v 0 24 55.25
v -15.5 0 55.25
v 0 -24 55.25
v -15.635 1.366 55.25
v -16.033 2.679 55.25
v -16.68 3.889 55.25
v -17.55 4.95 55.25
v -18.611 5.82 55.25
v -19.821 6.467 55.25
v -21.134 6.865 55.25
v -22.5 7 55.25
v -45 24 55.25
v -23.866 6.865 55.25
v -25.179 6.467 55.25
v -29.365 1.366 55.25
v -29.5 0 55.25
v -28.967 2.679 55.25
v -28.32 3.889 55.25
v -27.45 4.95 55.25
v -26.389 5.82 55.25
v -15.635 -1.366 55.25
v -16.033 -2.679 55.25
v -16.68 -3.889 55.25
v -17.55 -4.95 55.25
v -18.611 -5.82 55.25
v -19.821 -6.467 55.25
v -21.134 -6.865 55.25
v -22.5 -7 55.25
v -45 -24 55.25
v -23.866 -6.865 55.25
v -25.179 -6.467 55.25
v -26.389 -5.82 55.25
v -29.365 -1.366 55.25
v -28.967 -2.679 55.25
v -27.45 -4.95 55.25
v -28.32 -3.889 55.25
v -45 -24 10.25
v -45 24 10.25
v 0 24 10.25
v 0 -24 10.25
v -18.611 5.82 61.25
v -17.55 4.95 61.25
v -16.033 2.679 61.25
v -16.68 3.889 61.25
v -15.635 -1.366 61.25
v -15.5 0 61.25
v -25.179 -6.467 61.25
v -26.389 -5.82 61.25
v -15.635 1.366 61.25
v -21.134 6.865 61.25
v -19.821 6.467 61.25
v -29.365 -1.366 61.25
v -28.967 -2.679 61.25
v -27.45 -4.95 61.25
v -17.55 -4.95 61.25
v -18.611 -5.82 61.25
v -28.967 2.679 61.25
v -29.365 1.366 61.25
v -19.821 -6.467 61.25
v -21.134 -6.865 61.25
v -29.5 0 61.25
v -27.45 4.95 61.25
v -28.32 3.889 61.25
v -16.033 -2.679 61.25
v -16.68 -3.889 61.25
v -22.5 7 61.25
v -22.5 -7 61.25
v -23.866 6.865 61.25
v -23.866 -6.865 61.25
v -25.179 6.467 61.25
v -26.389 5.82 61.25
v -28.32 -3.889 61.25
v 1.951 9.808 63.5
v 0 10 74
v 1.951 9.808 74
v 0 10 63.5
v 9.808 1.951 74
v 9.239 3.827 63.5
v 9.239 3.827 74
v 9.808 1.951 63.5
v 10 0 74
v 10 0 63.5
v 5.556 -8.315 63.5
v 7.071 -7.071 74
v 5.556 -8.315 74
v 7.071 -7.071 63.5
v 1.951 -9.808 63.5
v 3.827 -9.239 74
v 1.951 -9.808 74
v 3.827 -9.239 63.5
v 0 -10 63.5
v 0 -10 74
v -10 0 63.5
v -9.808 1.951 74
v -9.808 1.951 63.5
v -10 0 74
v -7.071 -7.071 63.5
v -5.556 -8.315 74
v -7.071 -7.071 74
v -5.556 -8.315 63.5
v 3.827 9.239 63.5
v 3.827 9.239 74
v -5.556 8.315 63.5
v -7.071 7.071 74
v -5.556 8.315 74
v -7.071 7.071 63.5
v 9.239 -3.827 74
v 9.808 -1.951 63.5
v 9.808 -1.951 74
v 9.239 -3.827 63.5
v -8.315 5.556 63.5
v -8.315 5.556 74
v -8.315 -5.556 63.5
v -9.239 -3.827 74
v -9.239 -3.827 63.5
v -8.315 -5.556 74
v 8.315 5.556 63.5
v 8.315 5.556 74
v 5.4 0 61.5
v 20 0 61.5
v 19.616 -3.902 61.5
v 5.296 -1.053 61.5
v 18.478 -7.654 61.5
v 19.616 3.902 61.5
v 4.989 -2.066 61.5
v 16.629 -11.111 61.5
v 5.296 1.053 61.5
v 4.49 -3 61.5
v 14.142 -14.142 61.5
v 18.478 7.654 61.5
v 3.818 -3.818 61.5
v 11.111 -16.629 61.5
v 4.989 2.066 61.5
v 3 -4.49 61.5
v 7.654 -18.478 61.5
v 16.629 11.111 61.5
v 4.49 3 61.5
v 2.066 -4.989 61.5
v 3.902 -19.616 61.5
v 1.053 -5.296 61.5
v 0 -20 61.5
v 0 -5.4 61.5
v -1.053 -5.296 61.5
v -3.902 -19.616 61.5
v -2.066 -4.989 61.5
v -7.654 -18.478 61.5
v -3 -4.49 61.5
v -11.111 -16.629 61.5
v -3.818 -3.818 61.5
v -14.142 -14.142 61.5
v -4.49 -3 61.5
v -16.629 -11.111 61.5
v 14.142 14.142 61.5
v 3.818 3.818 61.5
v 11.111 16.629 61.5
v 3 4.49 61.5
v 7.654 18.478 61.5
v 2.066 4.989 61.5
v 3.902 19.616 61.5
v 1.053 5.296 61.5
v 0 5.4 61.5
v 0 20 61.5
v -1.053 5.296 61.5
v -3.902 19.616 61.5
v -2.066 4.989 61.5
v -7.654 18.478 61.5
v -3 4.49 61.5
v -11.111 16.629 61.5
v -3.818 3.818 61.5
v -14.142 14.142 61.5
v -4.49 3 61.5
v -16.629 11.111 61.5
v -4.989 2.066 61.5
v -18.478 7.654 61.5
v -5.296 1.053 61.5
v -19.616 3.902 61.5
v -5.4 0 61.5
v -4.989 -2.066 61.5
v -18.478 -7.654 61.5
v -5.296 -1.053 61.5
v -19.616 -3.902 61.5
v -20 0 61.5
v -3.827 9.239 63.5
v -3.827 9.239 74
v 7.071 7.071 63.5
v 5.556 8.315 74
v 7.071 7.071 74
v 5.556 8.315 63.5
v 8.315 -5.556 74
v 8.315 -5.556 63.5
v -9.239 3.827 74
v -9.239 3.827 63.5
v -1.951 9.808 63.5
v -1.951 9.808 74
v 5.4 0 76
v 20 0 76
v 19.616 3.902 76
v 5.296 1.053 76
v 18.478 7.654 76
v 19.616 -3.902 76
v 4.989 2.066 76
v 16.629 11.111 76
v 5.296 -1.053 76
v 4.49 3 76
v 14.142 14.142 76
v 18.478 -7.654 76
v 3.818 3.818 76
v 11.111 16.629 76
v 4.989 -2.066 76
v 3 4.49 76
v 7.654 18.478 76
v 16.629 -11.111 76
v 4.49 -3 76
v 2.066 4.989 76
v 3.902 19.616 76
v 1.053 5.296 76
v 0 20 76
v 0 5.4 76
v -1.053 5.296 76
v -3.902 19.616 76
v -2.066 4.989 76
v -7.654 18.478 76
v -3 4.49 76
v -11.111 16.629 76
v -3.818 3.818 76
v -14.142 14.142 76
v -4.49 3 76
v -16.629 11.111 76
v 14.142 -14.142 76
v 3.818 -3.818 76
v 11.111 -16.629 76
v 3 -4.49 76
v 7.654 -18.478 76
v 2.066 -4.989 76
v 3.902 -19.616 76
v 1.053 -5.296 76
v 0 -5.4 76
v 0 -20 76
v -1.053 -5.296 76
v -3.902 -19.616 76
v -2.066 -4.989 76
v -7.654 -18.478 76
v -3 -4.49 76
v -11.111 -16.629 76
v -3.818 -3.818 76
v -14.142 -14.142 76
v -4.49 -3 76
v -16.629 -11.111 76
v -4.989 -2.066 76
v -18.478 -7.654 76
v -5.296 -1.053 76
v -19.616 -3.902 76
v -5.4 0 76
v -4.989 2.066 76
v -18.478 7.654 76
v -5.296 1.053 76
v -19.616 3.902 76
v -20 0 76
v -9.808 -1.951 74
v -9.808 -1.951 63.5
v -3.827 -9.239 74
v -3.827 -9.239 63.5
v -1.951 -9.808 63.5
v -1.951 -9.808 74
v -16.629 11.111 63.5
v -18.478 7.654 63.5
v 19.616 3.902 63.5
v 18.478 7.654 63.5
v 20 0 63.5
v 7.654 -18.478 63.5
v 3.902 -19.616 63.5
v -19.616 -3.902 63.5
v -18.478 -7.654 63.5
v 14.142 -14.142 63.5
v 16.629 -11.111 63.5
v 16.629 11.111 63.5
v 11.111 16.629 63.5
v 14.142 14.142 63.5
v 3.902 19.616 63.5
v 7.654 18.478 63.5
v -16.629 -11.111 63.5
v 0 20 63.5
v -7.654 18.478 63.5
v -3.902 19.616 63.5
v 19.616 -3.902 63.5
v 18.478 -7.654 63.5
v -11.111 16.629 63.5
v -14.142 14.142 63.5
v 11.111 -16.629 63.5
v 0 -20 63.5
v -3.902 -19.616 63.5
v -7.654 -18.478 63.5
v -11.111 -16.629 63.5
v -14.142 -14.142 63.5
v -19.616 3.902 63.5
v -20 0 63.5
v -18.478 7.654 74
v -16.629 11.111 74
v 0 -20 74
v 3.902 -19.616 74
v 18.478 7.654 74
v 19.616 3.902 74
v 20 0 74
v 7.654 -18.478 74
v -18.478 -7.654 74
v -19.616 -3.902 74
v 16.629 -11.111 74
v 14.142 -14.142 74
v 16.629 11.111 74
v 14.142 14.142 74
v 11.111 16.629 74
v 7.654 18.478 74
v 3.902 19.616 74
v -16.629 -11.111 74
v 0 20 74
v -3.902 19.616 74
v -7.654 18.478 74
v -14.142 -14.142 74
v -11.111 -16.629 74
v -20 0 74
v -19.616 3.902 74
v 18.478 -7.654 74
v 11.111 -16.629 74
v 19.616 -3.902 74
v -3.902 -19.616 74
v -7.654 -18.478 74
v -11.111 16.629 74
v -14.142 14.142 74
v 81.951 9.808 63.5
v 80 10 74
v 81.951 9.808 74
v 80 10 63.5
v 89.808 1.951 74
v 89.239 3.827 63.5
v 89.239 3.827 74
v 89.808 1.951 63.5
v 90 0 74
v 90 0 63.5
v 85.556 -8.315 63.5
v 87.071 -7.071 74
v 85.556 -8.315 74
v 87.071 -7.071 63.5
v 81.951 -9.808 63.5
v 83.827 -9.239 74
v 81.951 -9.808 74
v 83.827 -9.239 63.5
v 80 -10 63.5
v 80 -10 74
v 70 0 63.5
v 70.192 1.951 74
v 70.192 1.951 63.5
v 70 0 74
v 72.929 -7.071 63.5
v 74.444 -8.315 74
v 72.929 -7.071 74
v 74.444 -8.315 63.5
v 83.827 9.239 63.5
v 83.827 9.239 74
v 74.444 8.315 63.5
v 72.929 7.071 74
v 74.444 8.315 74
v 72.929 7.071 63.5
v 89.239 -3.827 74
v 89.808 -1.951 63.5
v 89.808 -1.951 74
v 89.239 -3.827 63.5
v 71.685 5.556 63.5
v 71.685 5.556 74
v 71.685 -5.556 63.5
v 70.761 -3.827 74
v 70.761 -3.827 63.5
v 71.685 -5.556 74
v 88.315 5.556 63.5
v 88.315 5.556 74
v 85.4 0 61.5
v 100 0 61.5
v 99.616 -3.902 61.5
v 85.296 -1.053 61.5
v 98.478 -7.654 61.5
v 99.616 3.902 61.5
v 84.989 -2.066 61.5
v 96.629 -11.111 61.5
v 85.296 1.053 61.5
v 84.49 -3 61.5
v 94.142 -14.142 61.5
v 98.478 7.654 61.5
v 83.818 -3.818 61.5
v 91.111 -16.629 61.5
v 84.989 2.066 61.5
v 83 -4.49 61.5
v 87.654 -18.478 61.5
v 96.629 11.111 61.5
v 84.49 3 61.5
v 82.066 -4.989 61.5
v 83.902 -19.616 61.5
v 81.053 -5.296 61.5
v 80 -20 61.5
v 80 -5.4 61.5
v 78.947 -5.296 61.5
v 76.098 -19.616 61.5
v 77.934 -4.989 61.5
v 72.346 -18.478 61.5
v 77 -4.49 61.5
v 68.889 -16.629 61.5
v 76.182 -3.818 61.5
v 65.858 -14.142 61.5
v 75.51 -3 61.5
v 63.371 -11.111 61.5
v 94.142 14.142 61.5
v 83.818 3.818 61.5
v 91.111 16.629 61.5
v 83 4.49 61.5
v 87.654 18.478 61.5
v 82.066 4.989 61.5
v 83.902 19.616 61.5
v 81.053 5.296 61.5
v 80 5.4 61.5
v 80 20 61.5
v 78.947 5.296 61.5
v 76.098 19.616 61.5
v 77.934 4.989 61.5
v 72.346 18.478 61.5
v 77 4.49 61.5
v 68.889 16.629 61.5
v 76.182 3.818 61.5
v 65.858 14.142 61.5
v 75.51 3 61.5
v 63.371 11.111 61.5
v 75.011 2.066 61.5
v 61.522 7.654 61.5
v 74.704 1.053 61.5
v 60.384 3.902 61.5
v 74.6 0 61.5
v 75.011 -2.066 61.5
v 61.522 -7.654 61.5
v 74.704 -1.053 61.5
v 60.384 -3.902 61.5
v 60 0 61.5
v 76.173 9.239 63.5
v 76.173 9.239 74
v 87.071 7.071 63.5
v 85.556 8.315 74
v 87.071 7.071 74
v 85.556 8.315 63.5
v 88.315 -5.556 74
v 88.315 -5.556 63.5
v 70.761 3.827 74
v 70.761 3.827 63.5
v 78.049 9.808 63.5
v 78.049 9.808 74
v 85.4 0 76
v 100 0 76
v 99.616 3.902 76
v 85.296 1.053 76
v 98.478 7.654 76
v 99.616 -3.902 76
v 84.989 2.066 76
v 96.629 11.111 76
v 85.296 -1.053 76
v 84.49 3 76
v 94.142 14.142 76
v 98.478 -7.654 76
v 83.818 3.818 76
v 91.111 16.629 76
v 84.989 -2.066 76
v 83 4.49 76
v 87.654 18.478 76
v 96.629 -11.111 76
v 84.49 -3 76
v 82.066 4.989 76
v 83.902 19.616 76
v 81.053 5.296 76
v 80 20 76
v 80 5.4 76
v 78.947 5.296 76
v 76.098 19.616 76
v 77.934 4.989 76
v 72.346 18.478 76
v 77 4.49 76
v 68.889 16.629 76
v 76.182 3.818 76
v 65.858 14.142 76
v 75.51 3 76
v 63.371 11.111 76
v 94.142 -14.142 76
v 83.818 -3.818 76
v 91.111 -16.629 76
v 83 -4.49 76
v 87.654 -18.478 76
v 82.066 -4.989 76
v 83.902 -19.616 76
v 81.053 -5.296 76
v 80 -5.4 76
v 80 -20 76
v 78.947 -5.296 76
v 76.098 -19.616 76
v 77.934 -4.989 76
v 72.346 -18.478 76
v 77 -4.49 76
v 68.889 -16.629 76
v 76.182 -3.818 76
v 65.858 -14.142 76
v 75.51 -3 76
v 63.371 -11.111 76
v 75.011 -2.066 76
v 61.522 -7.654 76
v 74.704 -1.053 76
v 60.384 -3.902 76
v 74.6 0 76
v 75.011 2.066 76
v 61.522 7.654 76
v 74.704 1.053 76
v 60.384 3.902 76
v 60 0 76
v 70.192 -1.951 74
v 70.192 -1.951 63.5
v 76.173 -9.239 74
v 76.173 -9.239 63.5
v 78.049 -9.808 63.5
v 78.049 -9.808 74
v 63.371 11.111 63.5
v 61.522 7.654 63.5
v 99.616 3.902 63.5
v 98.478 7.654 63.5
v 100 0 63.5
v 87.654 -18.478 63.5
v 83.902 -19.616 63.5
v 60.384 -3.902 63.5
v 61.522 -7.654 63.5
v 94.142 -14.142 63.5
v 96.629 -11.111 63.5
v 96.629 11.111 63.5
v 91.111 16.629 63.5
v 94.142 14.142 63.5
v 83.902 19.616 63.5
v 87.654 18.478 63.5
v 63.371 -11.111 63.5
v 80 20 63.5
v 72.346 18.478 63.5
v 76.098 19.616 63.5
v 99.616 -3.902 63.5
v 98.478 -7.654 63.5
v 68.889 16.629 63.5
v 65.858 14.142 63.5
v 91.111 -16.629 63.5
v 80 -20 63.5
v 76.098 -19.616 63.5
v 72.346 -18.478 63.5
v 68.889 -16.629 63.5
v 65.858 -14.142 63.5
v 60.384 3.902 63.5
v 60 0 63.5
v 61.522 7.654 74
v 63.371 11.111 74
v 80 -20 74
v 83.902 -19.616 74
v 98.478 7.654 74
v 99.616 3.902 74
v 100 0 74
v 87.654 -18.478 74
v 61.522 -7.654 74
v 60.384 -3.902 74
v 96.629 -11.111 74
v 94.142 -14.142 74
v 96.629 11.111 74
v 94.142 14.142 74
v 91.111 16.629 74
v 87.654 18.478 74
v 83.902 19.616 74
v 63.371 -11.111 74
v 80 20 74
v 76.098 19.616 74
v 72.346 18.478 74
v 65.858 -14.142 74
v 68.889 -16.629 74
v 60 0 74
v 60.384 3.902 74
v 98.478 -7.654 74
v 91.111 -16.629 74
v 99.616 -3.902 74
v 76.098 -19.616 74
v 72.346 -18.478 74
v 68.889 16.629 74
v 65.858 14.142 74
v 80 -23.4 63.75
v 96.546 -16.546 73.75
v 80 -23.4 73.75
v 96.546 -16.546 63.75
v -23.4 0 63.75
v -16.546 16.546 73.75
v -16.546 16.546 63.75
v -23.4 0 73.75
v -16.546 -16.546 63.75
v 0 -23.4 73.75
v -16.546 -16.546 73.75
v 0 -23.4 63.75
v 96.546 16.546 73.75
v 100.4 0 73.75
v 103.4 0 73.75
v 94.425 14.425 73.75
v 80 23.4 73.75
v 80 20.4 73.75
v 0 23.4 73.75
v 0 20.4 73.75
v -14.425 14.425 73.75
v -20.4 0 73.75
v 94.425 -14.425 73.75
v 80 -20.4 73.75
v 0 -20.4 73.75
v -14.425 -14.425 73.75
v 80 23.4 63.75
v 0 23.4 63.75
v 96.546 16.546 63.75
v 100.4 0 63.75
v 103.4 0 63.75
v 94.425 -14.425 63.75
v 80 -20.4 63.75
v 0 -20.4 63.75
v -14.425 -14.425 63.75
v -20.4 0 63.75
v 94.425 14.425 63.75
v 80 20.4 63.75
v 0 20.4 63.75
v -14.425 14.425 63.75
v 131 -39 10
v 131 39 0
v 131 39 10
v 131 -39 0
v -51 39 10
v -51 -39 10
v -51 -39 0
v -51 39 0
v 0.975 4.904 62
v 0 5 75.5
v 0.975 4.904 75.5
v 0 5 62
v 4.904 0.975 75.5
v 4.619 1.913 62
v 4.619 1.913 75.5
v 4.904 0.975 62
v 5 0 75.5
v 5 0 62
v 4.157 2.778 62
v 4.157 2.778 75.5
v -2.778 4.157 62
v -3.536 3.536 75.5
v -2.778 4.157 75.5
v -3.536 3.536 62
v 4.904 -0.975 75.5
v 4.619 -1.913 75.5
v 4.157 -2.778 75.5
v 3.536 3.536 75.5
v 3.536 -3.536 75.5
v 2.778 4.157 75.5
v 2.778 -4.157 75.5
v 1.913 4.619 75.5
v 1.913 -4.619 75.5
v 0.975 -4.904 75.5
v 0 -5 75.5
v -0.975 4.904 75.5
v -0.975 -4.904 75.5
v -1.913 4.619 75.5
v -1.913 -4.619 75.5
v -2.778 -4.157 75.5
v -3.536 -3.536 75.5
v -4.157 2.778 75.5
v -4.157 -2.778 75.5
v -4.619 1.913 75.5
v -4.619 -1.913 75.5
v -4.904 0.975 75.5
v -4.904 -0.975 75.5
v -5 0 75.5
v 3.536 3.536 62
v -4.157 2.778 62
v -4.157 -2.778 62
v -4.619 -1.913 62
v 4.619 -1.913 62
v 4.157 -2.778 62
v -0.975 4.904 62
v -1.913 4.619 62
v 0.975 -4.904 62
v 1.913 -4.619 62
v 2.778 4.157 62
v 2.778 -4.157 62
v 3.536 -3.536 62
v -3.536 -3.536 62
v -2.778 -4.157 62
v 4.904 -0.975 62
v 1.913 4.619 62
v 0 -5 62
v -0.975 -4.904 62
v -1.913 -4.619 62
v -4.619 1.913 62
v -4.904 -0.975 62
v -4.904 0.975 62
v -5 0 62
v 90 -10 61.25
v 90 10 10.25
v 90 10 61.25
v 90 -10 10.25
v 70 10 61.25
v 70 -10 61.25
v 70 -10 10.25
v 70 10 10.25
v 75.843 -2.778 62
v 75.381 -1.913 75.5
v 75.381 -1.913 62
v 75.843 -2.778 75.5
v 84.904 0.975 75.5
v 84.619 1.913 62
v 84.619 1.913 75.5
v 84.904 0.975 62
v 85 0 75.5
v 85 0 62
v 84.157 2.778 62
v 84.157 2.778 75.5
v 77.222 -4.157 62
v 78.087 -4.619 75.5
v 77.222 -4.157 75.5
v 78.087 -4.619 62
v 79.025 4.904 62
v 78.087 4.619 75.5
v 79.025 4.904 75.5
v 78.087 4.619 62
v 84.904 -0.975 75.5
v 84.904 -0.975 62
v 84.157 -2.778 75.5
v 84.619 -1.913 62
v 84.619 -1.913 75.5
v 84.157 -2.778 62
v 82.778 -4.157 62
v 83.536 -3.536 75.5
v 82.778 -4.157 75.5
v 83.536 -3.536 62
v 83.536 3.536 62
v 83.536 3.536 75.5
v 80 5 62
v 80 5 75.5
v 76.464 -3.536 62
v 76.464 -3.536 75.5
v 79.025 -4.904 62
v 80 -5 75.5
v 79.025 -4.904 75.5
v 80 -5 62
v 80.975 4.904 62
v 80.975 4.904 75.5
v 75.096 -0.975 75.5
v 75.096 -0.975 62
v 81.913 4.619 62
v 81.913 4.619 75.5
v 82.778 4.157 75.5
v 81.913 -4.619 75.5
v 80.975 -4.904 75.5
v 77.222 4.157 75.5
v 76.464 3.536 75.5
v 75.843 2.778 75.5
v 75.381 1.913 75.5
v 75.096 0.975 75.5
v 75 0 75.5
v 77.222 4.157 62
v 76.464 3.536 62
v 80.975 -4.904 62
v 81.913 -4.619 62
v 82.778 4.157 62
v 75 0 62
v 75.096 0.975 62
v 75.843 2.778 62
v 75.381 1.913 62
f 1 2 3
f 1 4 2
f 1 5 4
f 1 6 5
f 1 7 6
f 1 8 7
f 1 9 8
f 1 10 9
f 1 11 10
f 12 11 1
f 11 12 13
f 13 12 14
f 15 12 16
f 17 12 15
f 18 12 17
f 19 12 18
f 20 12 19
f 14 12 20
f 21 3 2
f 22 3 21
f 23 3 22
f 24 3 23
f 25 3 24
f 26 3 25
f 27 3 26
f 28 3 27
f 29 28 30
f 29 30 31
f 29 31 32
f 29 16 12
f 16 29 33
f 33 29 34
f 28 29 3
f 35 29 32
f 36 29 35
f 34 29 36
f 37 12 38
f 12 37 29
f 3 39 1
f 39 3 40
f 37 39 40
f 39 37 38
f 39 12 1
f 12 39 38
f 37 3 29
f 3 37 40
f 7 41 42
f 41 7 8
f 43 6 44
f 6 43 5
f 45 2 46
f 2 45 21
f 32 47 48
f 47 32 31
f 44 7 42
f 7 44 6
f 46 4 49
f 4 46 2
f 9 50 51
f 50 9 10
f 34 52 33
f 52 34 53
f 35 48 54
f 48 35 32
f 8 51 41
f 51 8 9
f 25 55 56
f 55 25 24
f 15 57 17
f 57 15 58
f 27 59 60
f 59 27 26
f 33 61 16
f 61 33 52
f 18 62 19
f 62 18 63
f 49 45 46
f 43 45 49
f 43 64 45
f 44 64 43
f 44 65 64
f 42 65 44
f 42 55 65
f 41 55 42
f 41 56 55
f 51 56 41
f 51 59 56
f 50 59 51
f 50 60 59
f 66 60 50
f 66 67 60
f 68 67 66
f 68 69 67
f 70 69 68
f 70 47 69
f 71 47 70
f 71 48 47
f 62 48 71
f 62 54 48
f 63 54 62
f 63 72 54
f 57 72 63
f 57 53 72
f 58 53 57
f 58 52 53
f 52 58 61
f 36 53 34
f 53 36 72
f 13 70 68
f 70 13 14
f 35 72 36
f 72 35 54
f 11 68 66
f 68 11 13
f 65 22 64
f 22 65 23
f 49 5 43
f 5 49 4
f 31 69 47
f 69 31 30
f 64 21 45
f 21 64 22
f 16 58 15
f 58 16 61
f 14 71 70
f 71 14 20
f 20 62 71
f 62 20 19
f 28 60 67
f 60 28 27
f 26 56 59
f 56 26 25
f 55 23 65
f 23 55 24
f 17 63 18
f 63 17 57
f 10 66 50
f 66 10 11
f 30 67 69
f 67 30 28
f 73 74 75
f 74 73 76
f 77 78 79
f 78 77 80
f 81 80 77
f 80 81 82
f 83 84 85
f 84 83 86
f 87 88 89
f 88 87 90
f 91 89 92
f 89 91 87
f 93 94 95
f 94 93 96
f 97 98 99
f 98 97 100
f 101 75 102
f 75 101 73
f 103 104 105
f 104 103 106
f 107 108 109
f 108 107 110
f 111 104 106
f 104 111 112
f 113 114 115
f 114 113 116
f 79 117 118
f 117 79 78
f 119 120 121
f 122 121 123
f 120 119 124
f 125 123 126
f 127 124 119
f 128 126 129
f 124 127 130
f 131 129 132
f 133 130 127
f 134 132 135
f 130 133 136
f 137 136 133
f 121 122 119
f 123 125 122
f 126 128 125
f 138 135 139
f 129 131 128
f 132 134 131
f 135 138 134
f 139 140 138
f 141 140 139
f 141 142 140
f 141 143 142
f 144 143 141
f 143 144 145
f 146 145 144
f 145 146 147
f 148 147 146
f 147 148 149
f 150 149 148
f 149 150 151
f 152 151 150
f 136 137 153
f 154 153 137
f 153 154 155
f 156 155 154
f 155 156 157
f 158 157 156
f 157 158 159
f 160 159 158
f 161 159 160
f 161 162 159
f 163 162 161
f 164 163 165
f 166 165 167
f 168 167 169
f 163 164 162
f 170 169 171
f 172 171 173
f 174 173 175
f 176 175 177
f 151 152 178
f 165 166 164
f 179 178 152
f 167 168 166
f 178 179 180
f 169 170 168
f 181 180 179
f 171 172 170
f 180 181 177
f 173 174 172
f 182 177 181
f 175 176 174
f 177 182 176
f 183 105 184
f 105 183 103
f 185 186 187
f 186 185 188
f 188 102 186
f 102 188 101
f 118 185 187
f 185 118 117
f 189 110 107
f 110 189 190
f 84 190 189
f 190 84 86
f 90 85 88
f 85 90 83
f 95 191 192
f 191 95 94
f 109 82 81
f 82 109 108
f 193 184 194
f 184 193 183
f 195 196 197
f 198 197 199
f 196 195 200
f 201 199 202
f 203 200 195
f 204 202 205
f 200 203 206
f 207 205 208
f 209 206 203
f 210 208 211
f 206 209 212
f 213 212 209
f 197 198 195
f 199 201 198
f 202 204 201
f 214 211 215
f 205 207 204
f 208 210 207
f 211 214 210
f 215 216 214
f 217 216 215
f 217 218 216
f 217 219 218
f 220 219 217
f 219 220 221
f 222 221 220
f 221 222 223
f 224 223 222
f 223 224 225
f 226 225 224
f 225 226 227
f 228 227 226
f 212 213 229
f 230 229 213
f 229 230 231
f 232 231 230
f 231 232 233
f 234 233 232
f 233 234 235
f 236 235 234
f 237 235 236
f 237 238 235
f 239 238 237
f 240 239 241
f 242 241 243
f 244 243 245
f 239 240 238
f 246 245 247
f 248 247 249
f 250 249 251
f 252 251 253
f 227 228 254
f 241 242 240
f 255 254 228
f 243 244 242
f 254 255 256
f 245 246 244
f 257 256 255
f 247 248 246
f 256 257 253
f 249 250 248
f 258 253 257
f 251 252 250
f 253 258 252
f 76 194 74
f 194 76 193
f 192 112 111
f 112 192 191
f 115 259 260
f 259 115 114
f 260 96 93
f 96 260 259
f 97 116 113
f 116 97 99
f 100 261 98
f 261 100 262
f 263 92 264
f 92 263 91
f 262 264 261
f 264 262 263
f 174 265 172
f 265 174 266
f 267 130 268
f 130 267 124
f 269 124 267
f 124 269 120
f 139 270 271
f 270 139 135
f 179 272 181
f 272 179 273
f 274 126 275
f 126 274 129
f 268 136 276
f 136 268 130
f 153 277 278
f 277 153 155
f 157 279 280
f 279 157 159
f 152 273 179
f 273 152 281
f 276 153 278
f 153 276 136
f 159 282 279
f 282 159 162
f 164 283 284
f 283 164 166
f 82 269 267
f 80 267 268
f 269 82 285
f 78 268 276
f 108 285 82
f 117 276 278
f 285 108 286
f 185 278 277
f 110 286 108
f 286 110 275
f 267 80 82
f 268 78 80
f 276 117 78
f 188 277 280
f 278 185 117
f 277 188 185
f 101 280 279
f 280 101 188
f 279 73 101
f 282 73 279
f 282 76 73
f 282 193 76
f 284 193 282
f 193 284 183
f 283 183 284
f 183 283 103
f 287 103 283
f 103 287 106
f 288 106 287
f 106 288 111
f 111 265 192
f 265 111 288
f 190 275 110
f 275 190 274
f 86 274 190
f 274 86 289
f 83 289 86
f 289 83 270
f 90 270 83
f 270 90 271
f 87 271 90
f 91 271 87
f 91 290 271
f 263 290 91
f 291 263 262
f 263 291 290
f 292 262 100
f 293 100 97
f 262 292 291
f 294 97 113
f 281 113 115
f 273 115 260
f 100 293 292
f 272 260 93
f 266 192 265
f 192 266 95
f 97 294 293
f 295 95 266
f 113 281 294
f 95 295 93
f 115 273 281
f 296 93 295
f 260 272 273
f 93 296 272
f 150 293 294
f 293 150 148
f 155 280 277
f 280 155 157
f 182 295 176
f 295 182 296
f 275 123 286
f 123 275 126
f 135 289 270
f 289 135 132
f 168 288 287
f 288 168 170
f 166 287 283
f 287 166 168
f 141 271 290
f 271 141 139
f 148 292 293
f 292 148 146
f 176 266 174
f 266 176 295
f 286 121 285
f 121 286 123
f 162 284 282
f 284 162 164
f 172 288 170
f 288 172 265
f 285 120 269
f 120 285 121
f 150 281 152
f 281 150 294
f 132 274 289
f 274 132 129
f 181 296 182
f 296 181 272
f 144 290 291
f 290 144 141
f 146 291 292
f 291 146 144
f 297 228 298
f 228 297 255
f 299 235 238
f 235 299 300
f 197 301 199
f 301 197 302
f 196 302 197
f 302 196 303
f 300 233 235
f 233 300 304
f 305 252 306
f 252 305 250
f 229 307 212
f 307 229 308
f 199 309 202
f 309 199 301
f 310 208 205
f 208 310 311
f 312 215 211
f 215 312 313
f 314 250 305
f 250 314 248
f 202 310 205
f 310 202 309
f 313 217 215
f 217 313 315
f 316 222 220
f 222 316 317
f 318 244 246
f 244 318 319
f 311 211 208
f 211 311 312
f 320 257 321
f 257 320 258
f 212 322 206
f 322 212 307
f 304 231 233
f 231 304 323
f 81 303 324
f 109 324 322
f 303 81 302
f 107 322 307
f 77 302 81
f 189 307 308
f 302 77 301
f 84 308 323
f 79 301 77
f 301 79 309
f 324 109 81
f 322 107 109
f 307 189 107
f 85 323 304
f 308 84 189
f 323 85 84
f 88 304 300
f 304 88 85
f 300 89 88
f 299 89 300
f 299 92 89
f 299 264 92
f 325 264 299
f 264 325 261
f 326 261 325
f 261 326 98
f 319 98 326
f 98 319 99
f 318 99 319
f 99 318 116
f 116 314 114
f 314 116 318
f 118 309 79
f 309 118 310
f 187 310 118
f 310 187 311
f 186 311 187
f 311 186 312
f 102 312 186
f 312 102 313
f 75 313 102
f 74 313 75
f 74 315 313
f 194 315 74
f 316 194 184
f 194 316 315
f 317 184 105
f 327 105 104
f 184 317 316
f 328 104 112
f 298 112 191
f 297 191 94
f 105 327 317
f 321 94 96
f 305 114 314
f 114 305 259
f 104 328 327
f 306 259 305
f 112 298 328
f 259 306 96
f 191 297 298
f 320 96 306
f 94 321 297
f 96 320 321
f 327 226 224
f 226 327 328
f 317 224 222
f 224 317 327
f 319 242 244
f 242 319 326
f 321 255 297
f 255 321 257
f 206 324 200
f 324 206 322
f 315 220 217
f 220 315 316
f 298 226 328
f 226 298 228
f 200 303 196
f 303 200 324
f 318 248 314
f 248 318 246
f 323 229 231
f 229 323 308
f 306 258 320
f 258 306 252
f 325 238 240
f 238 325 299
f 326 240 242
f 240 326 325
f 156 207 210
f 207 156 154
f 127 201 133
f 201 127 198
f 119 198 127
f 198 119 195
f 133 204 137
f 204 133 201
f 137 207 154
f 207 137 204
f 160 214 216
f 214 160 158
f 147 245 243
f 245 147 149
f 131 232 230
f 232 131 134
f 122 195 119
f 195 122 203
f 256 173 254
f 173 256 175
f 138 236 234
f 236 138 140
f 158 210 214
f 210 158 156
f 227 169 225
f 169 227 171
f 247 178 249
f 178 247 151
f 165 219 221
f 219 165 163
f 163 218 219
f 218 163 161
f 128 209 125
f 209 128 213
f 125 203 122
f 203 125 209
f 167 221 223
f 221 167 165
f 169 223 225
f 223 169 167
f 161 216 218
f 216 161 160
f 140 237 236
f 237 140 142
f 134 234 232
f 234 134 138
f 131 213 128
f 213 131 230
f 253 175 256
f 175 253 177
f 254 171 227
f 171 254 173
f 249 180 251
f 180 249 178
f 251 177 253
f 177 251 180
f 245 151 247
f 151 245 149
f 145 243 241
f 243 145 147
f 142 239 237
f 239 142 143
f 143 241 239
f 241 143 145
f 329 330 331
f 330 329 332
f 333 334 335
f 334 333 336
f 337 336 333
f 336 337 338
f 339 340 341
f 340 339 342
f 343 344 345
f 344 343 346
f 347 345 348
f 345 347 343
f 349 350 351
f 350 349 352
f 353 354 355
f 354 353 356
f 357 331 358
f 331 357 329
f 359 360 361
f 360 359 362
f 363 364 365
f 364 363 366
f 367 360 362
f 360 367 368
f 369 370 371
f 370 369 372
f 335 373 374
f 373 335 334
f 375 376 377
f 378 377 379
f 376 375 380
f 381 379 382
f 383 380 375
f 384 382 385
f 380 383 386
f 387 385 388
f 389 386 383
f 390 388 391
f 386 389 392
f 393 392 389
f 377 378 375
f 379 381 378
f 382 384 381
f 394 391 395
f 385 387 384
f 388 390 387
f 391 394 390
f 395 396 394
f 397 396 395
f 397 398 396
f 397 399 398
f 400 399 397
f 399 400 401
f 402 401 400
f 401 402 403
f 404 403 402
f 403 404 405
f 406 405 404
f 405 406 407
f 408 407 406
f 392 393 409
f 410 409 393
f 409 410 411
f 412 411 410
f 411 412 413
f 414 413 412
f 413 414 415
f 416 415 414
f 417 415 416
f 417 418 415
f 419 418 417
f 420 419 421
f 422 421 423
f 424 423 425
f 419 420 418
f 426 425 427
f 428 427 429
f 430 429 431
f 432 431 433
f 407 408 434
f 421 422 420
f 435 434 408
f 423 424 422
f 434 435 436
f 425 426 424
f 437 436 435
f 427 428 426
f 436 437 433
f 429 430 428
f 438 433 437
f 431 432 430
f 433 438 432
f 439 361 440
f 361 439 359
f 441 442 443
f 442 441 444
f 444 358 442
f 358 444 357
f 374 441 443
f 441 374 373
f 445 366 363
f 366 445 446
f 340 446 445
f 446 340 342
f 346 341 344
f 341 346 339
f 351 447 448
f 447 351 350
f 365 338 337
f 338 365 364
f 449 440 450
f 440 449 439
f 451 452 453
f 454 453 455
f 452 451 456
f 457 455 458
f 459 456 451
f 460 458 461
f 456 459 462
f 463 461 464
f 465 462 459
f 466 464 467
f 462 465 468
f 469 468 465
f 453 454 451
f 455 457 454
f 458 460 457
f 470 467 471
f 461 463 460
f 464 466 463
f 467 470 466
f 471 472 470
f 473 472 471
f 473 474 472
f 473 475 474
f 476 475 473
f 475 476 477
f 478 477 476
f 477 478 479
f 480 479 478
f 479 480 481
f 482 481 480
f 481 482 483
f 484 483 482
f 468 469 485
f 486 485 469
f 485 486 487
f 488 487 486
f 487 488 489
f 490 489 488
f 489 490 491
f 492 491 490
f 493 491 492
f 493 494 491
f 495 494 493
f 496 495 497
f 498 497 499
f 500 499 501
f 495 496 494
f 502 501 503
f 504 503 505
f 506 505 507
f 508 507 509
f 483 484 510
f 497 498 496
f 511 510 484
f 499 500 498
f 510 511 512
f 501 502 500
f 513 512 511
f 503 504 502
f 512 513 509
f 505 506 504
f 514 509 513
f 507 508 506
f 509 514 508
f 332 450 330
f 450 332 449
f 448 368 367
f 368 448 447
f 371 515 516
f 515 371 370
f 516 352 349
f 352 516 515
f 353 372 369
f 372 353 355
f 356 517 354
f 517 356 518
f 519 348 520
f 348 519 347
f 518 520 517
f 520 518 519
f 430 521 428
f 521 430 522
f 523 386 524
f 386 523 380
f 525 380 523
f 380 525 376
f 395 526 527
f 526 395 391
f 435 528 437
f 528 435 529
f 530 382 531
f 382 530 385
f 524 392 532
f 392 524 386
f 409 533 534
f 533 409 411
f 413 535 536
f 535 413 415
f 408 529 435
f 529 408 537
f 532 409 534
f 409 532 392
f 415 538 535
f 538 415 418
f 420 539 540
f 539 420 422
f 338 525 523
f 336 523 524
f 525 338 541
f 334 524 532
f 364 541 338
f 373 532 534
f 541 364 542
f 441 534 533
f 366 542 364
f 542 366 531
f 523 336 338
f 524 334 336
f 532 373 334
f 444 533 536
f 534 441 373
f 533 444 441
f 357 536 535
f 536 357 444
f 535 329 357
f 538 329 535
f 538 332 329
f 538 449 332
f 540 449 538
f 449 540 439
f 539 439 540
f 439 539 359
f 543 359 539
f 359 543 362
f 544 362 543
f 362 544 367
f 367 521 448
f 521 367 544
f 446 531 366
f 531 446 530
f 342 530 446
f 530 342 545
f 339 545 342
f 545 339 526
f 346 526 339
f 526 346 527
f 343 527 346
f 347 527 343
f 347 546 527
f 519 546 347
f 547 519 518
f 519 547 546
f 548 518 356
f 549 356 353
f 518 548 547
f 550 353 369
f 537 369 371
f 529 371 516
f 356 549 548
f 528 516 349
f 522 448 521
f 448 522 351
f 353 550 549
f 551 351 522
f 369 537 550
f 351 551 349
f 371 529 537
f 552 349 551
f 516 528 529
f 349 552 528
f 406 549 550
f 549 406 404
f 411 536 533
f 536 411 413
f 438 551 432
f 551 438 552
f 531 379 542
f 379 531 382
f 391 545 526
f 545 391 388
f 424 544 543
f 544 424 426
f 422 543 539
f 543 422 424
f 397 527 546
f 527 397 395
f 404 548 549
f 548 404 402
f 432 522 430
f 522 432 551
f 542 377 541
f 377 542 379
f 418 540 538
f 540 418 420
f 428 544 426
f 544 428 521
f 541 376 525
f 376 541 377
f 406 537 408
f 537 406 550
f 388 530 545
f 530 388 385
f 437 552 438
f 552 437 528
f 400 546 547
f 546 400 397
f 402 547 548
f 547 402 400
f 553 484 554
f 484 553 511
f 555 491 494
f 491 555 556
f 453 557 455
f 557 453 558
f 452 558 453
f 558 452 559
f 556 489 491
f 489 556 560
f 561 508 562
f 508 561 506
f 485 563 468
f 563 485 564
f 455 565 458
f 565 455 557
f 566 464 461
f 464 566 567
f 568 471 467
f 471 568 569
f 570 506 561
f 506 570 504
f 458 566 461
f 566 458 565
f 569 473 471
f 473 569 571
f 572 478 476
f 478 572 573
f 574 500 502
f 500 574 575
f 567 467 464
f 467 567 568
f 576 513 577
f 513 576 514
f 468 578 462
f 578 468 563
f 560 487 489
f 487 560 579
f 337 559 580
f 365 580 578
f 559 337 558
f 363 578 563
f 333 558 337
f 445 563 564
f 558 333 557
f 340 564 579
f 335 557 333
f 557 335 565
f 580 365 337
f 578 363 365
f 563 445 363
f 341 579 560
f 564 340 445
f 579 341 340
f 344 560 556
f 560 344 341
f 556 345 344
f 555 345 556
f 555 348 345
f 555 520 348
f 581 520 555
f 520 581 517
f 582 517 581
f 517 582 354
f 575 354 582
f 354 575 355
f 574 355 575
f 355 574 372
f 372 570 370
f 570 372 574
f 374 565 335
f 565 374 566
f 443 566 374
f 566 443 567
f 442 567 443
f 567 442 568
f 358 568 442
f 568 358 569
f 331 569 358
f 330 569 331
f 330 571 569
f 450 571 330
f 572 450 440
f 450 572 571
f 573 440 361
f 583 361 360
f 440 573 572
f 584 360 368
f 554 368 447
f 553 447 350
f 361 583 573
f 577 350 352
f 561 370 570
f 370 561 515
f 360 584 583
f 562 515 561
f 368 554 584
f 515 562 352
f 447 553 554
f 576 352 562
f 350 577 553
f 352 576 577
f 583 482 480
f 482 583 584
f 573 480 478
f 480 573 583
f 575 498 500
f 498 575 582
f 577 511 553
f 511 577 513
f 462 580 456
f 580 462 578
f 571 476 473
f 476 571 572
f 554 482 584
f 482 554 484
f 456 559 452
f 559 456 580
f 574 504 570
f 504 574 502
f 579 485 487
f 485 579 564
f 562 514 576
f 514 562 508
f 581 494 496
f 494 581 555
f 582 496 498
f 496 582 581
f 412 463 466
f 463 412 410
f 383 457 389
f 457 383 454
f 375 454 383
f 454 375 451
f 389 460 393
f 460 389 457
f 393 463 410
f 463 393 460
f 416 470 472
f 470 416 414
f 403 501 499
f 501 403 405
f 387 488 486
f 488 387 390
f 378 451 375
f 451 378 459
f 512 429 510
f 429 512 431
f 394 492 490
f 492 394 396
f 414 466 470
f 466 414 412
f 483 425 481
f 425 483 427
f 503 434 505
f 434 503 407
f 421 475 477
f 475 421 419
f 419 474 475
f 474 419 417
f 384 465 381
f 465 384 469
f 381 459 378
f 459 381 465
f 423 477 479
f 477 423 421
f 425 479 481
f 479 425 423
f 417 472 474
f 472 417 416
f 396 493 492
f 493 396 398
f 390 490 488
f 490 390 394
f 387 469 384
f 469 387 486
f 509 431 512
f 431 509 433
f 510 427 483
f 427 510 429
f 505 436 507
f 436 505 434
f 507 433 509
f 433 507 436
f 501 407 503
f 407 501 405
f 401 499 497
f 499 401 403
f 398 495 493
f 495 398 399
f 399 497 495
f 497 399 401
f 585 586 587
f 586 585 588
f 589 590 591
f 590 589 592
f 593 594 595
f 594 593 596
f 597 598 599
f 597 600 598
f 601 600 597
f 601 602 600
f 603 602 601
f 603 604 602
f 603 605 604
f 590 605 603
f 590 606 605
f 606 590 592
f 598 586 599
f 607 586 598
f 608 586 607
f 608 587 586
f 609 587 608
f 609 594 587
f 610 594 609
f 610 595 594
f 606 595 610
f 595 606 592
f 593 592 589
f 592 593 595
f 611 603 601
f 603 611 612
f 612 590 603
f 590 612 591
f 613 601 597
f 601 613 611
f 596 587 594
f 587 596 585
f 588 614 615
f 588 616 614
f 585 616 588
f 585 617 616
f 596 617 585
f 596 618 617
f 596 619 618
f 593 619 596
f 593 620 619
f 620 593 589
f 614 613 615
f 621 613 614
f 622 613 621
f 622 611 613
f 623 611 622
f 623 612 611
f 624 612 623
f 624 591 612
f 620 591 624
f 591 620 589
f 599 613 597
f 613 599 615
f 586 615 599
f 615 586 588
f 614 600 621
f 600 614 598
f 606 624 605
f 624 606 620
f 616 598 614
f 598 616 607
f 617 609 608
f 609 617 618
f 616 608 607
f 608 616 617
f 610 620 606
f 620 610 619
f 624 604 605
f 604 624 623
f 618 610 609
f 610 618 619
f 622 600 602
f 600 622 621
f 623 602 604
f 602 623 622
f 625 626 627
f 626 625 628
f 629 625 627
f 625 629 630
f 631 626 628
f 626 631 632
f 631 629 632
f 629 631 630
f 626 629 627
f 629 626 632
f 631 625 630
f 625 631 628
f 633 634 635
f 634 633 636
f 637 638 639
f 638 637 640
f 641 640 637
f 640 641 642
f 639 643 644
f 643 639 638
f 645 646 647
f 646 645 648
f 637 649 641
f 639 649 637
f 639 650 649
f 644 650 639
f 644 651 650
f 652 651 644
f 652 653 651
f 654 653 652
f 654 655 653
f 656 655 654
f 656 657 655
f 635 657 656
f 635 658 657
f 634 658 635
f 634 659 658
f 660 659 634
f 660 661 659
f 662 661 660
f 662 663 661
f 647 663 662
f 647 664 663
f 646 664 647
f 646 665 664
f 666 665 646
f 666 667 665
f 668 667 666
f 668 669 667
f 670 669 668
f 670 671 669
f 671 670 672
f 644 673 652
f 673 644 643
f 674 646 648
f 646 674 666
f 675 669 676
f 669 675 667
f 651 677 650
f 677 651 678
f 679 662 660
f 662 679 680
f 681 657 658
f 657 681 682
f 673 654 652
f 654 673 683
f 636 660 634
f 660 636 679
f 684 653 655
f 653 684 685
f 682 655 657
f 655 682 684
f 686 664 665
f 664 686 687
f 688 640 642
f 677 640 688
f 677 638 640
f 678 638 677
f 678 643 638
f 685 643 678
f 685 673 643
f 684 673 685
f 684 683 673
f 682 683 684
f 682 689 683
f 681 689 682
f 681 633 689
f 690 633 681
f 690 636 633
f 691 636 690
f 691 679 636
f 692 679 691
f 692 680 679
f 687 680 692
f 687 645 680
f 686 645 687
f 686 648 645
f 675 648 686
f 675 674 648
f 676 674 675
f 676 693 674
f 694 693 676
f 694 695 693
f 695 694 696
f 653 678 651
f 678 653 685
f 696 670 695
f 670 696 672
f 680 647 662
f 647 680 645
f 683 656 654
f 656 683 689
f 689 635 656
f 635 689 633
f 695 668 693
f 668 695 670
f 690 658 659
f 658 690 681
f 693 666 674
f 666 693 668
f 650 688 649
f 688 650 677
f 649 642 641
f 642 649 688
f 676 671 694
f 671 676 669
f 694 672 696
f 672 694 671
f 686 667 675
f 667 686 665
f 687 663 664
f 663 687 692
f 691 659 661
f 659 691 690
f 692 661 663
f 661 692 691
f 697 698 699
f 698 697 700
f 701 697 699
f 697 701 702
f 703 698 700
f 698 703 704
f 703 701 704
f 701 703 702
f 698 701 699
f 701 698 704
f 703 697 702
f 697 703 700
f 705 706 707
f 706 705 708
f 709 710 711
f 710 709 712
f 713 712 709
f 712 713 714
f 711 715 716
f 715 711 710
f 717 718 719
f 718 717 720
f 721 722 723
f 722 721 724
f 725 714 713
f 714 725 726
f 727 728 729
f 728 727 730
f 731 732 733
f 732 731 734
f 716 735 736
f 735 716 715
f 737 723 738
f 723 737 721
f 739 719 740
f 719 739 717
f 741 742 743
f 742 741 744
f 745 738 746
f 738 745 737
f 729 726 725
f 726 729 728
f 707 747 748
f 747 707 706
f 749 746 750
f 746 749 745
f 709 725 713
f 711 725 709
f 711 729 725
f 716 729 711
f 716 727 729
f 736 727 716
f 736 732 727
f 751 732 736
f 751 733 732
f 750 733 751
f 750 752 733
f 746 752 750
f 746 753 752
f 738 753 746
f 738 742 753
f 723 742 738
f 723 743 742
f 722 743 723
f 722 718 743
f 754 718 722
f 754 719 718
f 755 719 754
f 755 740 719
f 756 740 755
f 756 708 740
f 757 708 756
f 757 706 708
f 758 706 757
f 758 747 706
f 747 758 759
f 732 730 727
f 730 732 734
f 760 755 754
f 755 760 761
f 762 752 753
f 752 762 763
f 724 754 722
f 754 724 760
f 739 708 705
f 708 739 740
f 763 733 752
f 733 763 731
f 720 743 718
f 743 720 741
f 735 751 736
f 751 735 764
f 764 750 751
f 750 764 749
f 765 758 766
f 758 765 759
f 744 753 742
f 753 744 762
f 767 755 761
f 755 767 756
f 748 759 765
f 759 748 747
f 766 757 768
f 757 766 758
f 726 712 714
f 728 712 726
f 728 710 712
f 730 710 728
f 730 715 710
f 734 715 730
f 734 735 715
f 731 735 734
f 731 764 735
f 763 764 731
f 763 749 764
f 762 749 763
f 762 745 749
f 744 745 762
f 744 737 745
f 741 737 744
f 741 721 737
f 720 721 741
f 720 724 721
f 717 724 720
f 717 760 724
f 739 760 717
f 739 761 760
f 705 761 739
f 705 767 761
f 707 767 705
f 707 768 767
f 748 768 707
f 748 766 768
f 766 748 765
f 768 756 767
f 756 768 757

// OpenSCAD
$fn = 32;

// ------------------------------------------------------------------------
// Motor belt drive: span 80 mm, pulleys d40, belt 10 mm wide
// Every part is its own module, assembly() places every instance.
// ------------------------------------------------------------------------

// --- part 1 ---
module base_plate() {
  difference() {
    translate([-91, -39, 0]) cube([182, 78, 10]);
  }
}

// --- part 2 ---
module motor() {
  union() {
    translate([-22.5, -24, 0]) cube([45, 48, 45]);
    translate([25.5, 0, 22.5]) rotate([0, 90, 0]) cylinder(h = 6, d = 14, center = true);
  }
}

// --- part 3 ---
module drive_shaft() {
  translate([0, 0, -6.75]) cylinder(h = 13.5, d = 10);
}

// --- part 4 ---
module pulley_drive() {
  difference() {
    union() {
      cylinder(h = 14.5, d = 20);
      cylinder(h = 2, d = 40);
      translate([0, 0, 12.5]) cylinder(h = 2, d = 40);
    }
    translate([0, 0, -1]) cylinder(h = 16.5, d = 10.8);
  }
}

// --- part 5 ---
module idler_post() {
  translate([-10, -10, 0]) cube([20, 20, 51]);
}

// --- part 6 ---
module driven_shaft() {
  translate([0, 0, -6.75]) cylinder(h = 13.5, d = 10);
}

// --- part 7 ---
module pulley_driven() {
  difference() {
    union() {
      cylinder(h = 14.5, d = 20);
      cylinder(h = 2, d = 40);
      translate([0, 0, 12.5]) cylinder(h = 2, d = 40);
    }
    translate([0, 0, -1]) cylinder(h = 16.5, d = 10.8);
  }
}

// --- part 8 ---
module drive_belt() {
  difference() {
    linear_extrude(height = 10) polygon(points = concat([for (a = [90 : 45 : 270]) [23.4 * cos(a), 23.4 * sin(a)]], [for (a = [270 : 45 : 450]) [80 + 23.4 * cos(a), 23.4 * sin(a)]]));
    translate([0, 0, -1]) linear_extrude(height = 12) polygon(points = concat([for (a = [90 : 45 : 270]) [20.4 * cos(a), 20.4 * sin(a)]], [for (a = [270 : 45 : 450]) [80 + 20.4 * cos(a), 20.4 * sin(a)]]));
  }
}

// --- assembly ---
module assembly() {
  color([0.80, 0.24, 0.20]) translate([40, 0, 0]) rotate([0, 0, 0]) base_plate();
  color([0.20, 0.45, 0.75]) translate([0, 0, 32.75]) rotate([0, 270, 0]) motor();
  color([0.25, 0.62, 0.32]) translate([0, 0, 68.75]) rotate([0, 0, 0]) drive_shaft();
  color([0.92, 0.70, 0.18]) translate([0, 0, 61.5]) rotate([0, 0, 0]) pulley_drive();
  color([0.58, 0.35, 0.70]) translate([80, 0, 10.25]) rotate([0, 0, 0]) idler_post();
  color([0.16, 0.66, 0.66]) translate([80, 0, 68.75]) rotate([0, 0, 0]) driven_shaft();
  color([0.85, 0.48, 0.18]) translate([80, 0, 61.5]) rotate([0, 0, 0]) pulley_driven();
  color([0.55, 0.60, 0.65]) translate([0, 0, 63.75]) rotate([0, 0, 0]) drive_belt();
}

assembly();
